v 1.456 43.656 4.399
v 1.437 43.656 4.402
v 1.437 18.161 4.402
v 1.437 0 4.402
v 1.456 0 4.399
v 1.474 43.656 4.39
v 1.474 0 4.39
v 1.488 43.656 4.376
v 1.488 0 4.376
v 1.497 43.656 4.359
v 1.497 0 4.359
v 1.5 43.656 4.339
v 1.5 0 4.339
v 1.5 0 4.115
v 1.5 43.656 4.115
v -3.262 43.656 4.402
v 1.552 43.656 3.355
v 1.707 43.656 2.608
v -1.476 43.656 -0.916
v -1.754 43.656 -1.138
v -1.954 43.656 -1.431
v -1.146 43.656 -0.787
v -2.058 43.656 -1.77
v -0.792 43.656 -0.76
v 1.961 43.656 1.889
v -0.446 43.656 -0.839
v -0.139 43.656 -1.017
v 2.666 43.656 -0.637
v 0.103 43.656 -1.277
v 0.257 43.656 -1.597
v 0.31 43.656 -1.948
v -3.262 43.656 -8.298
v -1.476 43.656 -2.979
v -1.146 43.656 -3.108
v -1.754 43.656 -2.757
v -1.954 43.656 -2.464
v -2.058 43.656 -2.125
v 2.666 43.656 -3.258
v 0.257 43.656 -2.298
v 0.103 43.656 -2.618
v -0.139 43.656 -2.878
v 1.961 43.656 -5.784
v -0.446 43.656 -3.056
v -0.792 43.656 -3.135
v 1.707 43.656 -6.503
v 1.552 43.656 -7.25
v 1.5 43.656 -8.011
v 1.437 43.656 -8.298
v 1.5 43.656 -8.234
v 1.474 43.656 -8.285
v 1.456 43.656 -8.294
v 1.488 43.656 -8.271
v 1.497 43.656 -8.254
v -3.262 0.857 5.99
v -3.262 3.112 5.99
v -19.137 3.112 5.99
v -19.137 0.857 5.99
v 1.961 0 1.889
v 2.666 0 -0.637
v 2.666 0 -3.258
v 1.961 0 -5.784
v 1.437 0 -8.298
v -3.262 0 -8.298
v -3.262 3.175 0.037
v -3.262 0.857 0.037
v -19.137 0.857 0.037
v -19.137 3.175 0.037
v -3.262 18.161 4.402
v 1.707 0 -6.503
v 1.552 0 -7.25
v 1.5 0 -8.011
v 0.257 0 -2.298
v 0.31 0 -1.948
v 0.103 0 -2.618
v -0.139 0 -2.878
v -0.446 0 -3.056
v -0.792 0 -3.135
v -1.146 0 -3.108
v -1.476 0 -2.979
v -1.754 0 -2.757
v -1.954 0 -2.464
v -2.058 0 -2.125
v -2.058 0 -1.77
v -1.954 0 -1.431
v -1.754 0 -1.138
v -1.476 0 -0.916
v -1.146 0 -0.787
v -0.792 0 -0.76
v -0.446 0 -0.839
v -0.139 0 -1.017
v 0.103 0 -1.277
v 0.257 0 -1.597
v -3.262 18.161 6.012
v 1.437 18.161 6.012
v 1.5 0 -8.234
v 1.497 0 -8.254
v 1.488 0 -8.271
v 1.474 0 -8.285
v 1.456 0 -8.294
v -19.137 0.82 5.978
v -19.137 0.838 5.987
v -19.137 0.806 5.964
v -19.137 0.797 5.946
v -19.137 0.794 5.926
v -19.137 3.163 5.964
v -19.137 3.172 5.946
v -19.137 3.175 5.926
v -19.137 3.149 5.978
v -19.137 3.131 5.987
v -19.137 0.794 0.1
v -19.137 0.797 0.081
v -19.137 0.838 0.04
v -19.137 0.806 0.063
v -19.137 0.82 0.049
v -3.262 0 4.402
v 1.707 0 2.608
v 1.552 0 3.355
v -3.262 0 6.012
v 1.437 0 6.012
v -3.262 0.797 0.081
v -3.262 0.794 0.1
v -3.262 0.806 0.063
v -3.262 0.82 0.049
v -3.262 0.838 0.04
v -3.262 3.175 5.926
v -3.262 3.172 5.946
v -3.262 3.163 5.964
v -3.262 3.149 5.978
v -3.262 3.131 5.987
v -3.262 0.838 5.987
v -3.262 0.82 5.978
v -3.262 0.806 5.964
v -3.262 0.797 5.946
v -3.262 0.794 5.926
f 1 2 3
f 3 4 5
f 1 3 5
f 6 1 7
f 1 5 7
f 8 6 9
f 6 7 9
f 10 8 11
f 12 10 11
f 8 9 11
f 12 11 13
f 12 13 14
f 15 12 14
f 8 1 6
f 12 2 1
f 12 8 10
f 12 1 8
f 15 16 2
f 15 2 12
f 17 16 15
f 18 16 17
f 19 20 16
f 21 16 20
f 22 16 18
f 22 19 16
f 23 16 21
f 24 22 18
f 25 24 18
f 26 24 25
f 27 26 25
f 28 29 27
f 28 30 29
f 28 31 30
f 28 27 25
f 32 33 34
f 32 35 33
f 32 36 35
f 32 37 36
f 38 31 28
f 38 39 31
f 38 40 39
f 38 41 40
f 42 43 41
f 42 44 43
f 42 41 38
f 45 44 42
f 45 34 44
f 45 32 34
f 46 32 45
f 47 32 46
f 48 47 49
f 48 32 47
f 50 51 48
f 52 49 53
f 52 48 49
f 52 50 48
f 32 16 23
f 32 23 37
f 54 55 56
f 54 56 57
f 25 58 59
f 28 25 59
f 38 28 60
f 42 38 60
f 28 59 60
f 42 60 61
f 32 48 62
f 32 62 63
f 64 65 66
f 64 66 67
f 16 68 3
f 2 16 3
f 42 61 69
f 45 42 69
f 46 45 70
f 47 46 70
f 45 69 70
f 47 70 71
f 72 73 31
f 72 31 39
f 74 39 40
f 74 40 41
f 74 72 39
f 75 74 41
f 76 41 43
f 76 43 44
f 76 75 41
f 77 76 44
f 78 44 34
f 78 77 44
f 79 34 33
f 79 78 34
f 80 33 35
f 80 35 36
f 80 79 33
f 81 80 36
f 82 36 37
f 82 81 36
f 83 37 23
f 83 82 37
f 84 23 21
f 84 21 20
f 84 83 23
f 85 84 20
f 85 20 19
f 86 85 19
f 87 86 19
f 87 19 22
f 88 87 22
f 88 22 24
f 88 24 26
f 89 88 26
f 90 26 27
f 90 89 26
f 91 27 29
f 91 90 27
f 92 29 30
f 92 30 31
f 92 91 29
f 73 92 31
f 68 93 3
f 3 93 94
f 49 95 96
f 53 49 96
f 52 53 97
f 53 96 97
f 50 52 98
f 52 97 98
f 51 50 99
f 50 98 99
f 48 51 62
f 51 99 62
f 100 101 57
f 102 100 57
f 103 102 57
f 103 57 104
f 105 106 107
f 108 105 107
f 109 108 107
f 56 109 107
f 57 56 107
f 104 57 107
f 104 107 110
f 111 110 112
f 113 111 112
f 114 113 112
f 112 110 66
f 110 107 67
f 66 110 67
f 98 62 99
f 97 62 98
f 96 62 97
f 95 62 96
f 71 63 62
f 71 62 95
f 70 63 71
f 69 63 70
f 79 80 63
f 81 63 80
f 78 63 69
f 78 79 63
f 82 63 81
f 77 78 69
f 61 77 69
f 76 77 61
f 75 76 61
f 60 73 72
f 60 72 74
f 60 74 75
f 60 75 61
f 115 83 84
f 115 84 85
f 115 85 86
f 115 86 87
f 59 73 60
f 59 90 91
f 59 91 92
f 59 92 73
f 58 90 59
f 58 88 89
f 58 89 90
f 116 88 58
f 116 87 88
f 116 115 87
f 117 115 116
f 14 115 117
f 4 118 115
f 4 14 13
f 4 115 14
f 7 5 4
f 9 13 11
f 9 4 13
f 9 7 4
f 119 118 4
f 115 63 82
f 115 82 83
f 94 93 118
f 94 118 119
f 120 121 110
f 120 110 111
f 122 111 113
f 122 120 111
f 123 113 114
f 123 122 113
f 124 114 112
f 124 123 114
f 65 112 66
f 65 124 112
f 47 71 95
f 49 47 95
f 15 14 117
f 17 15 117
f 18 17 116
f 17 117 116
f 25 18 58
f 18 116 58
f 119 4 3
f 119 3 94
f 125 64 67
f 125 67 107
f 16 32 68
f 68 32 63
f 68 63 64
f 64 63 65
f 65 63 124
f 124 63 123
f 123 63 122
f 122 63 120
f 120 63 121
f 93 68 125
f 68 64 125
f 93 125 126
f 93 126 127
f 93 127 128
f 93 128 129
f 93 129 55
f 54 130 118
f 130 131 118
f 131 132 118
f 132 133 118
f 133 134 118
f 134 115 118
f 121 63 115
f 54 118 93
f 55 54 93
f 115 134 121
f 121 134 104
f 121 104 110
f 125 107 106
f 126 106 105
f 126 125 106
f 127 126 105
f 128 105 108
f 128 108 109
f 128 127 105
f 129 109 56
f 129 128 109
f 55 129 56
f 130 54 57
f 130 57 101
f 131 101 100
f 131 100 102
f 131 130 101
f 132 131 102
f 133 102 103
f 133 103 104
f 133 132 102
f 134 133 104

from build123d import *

# Parameters (mm, degrees)
SKETCH1_R           = 1.190625
BOSS_EXTRUDE4_DEPTH = 43.65625
BOSS_EXTRUDE5_DEPTH = 15.875
SKETCH7_W           = 4.699305321
SKETCH7_H           = 1.609279132
BOSS_EXTRUDE6_DEPTH = 18.161


with BuildPart() as part:
    # Sketch1 → Boss-Extrude4 (new body)
    with BuildSketch(Plane(origin=(0, 0, 0), x_dir=(1, 0, 0), z_dir=(0, 1, 0))):
        with BuildLine():
            ThreePointArc((1.961121792, 5.783909674), (1.616585512, 6.873597745), (1.500127735, 8.01050712))
            Line((1.500127735, 8.01050712), (1.500127735, 8.234009675))
            ThreePointArc((1.500127735, 8.234009675), (1.481529016, 8.278910955), (1.436627735, 8.297509675))
            Line((1.436627735, 8.297509675), (-2.865497265, 8.297509675))
            Line((-2.865497265, 8.297509675), (-3.262372265, 8.297509675))
            Line((-3.262372265, 8.297509675), (-3.262372265, 7.900634675))
            Line((-3.262372265, 7.900634675), (-3.262372265, -4.005615325))
            Line((-3.262372265, -4.005615325), (-3.262372265, -4.402490325))
            Line((-3.262372265, -4.402490325), (-2.865497265, -4.402490325))
            Line((-2.865497265, -4.402490325), (1.436627735, -4.402490325))
            ThreePointArc((1.436627735, -4.402490325), (1.481529016, -4.383891606), (1.500127735, -4.338990325))
            Line((1.500127735, -4.338990325), (1.500127735, -4.11548777))
            ThreePointArc((1.500127735, -4.11548777), (1.616585512, -2.978578396), (1.961121792, -1.888890325))
            ThreePointArc((1.961121792, -1.888890325), (2.755408878, 1.947509675), (1.961121792, 5.783909674))
        make_face()
        with Locations((-0.881122265, 1.947509675)):
            Circle(SKETCH1_R, mode=Mode.SUBTRACT)
    extrude(amount=BOSS_EXTRUDE4_DEPTH)

    # Sketch6 → Boss-Extrude5 (add)
    with BuildSketch(Plane.ZY.offset(3.262372265)):
        with BuildLine():
            Line((0.036865325, 3.175), (5.926490325, 3.175))
            ThreePointArc((5.926490325, 3.175), (5.971391606, 3.156401281), (5.989990325, 3.1115))
            Line((5.989990325, 3.1115), (5.989990325, 0.85725))
            ThreePointArc((5.989990325, 0.85725), (5.971391606, 0.812348719), (5.926490325, 0.79375))
            Line((5.926490325, 0.79375), (0.100365325, 0.79375))
            ThreePointArc((0.100365325, 0.79375), (0.055464045, 0.812348719), (0.036865325, 0.85725))
            Line((0.036865325, 0.85725), (0.036865325, 3.175))
        make_face()
    extrude(amount=BOSS_EXTRUDE5_DEPTH)

    # Sketch7 → Boss-Extrude6 (add)
    with BuildSketch(Plane.XZ):
        with Locations((-0.912719605, 5.207129891)):
            Rectangle(SKETCH7_W, SKETCH7_H)
    extrude(amount=-BOSS_EXTRUDE6_DEPTH)


solid = part.part
